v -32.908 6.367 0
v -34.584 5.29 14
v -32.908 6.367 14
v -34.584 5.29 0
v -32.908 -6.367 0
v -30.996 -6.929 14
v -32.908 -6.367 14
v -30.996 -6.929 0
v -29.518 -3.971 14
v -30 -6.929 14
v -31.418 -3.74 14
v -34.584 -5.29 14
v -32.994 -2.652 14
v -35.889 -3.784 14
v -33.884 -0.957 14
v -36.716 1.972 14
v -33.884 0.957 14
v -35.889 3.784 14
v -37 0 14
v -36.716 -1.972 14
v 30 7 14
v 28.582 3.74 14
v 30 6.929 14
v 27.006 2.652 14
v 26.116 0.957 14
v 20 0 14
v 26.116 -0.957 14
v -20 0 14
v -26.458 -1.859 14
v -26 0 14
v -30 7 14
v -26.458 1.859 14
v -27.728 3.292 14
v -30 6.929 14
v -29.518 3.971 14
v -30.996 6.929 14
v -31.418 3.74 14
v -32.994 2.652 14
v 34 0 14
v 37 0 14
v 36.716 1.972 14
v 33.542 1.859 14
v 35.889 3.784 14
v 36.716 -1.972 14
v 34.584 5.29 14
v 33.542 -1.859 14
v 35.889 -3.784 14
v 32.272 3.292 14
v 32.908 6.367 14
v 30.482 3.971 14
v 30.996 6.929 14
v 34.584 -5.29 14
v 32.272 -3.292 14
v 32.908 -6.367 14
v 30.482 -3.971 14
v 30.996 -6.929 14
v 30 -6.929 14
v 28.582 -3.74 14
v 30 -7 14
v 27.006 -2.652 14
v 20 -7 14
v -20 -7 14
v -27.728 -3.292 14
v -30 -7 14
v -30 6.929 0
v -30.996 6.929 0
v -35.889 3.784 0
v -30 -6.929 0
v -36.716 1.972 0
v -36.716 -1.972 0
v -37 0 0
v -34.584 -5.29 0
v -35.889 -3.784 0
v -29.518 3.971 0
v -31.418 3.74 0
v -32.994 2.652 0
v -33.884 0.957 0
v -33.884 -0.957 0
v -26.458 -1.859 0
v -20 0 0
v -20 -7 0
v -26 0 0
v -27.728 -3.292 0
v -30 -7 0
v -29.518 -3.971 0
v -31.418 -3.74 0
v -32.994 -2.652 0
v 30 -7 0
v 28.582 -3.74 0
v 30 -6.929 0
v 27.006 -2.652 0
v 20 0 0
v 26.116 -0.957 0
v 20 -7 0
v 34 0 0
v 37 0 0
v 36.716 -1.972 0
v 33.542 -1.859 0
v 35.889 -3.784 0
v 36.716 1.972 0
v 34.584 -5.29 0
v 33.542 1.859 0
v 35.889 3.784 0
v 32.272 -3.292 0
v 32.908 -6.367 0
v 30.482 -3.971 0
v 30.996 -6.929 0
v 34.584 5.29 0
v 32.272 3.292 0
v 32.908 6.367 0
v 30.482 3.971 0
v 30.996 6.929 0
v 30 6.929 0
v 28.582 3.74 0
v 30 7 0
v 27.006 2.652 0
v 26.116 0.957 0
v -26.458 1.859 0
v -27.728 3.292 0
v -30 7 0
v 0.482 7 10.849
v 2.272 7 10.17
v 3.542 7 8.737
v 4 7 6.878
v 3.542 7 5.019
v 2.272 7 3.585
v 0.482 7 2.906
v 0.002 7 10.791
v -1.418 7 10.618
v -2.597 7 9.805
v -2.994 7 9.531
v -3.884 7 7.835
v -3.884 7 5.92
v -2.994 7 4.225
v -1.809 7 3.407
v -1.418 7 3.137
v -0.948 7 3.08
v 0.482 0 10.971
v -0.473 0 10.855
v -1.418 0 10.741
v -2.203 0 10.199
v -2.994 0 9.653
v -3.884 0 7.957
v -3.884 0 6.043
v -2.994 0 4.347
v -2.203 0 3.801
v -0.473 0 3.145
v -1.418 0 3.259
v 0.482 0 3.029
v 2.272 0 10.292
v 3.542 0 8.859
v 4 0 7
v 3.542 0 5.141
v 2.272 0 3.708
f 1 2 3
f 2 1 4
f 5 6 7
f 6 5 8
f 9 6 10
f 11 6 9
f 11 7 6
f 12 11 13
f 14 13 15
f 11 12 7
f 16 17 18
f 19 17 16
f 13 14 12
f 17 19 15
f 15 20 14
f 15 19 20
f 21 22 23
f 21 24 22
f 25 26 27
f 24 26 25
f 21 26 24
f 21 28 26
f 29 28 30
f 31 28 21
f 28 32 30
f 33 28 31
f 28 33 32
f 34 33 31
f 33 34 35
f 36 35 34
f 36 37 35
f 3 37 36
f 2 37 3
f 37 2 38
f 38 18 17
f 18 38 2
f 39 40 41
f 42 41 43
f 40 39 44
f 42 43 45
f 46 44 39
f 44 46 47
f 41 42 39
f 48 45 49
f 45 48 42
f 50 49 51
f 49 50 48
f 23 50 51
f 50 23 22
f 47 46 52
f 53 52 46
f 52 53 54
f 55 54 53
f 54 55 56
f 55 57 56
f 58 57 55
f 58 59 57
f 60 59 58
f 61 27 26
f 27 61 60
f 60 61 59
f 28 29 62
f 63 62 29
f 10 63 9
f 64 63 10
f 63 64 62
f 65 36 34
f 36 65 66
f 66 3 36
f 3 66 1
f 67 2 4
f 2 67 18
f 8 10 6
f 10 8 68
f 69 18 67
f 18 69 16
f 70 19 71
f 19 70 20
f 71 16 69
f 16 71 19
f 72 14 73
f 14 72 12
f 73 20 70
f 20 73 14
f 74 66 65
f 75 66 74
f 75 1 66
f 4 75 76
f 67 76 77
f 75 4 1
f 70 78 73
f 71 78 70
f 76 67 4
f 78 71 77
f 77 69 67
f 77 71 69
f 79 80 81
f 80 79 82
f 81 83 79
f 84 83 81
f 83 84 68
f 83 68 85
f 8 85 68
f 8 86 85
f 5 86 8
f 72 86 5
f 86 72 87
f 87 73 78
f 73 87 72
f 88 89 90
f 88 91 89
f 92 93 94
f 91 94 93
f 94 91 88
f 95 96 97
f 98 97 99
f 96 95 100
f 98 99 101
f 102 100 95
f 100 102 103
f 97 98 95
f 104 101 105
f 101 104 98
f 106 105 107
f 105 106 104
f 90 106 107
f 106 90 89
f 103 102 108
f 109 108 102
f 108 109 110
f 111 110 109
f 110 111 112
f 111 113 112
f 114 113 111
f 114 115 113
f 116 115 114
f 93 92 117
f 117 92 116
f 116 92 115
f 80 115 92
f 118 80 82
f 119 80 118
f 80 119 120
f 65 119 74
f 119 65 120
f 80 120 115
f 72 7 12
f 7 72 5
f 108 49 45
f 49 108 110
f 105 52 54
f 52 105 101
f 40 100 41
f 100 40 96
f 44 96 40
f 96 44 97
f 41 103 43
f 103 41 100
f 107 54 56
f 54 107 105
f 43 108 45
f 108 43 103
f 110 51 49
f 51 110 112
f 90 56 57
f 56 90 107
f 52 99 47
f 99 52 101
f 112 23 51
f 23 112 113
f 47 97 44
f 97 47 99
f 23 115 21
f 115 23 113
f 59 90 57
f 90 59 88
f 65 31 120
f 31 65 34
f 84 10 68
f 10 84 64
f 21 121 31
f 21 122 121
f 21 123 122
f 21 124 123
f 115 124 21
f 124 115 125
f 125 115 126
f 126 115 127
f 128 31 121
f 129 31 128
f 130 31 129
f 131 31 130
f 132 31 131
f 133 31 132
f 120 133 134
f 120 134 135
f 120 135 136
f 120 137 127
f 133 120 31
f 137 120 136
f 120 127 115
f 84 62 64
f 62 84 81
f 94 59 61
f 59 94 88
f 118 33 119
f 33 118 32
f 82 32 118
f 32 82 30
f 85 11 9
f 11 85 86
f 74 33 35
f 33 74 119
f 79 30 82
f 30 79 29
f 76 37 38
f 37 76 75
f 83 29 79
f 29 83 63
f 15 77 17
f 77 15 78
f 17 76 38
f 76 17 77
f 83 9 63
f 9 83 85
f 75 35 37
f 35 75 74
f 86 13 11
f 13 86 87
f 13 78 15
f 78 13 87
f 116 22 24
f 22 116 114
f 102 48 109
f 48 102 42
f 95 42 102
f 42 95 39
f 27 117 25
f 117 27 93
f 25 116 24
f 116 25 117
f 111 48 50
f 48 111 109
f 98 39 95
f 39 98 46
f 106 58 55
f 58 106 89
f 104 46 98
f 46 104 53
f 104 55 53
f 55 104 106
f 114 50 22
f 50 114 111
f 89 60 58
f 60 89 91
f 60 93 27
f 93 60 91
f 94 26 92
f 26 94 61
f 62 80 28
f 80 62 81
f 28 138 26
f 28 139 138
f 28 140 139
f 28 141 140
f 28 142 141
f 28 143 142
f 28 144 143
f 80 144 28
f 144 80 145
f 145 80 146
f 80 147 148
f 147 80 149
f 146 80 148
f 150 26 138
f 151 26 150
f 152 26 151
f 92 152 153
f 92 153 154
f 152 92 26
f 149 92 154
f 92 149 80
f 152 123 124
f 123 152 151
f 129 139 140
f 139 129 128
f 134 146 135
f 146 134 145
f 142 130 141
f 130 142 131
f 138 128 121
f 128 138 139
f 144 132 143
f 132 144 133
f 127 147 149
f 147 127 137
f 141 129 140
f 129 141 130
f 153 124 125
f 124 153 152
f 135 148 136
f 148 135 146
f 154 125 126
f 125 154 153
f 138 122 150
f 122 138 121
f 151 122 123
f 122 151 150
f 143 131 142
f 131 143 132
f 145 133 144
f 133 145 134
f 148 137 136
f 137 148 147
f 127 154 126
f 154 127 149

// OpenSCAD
rod_diameter=8;

rod_radius=rod_diameter/2;

rod_od_dia=rod_diameter+6;
rod_od_rad=rod_od_dia/2;

difference() {
	union() {
		for (x=[-1,1]) translate([x*30,0,0]) cylinder(14,rod_od_rad,rod_od_rad,false);
		translate([0,0,7]) cube([60,rod_od_dia,14],true);
	}
	for (x=[-1,1]) translate([x*30,0,-1]) cylinder(14+2,rod_radius,rod_radius,false);
translate([0,-rod_od_rad,7]) cube([40,rod_od_dia,16],true);
translate([0,0,7]) rotate([89,0,0]) cylinder(rod_od_dia*2,8/2,8/2,true);
}
